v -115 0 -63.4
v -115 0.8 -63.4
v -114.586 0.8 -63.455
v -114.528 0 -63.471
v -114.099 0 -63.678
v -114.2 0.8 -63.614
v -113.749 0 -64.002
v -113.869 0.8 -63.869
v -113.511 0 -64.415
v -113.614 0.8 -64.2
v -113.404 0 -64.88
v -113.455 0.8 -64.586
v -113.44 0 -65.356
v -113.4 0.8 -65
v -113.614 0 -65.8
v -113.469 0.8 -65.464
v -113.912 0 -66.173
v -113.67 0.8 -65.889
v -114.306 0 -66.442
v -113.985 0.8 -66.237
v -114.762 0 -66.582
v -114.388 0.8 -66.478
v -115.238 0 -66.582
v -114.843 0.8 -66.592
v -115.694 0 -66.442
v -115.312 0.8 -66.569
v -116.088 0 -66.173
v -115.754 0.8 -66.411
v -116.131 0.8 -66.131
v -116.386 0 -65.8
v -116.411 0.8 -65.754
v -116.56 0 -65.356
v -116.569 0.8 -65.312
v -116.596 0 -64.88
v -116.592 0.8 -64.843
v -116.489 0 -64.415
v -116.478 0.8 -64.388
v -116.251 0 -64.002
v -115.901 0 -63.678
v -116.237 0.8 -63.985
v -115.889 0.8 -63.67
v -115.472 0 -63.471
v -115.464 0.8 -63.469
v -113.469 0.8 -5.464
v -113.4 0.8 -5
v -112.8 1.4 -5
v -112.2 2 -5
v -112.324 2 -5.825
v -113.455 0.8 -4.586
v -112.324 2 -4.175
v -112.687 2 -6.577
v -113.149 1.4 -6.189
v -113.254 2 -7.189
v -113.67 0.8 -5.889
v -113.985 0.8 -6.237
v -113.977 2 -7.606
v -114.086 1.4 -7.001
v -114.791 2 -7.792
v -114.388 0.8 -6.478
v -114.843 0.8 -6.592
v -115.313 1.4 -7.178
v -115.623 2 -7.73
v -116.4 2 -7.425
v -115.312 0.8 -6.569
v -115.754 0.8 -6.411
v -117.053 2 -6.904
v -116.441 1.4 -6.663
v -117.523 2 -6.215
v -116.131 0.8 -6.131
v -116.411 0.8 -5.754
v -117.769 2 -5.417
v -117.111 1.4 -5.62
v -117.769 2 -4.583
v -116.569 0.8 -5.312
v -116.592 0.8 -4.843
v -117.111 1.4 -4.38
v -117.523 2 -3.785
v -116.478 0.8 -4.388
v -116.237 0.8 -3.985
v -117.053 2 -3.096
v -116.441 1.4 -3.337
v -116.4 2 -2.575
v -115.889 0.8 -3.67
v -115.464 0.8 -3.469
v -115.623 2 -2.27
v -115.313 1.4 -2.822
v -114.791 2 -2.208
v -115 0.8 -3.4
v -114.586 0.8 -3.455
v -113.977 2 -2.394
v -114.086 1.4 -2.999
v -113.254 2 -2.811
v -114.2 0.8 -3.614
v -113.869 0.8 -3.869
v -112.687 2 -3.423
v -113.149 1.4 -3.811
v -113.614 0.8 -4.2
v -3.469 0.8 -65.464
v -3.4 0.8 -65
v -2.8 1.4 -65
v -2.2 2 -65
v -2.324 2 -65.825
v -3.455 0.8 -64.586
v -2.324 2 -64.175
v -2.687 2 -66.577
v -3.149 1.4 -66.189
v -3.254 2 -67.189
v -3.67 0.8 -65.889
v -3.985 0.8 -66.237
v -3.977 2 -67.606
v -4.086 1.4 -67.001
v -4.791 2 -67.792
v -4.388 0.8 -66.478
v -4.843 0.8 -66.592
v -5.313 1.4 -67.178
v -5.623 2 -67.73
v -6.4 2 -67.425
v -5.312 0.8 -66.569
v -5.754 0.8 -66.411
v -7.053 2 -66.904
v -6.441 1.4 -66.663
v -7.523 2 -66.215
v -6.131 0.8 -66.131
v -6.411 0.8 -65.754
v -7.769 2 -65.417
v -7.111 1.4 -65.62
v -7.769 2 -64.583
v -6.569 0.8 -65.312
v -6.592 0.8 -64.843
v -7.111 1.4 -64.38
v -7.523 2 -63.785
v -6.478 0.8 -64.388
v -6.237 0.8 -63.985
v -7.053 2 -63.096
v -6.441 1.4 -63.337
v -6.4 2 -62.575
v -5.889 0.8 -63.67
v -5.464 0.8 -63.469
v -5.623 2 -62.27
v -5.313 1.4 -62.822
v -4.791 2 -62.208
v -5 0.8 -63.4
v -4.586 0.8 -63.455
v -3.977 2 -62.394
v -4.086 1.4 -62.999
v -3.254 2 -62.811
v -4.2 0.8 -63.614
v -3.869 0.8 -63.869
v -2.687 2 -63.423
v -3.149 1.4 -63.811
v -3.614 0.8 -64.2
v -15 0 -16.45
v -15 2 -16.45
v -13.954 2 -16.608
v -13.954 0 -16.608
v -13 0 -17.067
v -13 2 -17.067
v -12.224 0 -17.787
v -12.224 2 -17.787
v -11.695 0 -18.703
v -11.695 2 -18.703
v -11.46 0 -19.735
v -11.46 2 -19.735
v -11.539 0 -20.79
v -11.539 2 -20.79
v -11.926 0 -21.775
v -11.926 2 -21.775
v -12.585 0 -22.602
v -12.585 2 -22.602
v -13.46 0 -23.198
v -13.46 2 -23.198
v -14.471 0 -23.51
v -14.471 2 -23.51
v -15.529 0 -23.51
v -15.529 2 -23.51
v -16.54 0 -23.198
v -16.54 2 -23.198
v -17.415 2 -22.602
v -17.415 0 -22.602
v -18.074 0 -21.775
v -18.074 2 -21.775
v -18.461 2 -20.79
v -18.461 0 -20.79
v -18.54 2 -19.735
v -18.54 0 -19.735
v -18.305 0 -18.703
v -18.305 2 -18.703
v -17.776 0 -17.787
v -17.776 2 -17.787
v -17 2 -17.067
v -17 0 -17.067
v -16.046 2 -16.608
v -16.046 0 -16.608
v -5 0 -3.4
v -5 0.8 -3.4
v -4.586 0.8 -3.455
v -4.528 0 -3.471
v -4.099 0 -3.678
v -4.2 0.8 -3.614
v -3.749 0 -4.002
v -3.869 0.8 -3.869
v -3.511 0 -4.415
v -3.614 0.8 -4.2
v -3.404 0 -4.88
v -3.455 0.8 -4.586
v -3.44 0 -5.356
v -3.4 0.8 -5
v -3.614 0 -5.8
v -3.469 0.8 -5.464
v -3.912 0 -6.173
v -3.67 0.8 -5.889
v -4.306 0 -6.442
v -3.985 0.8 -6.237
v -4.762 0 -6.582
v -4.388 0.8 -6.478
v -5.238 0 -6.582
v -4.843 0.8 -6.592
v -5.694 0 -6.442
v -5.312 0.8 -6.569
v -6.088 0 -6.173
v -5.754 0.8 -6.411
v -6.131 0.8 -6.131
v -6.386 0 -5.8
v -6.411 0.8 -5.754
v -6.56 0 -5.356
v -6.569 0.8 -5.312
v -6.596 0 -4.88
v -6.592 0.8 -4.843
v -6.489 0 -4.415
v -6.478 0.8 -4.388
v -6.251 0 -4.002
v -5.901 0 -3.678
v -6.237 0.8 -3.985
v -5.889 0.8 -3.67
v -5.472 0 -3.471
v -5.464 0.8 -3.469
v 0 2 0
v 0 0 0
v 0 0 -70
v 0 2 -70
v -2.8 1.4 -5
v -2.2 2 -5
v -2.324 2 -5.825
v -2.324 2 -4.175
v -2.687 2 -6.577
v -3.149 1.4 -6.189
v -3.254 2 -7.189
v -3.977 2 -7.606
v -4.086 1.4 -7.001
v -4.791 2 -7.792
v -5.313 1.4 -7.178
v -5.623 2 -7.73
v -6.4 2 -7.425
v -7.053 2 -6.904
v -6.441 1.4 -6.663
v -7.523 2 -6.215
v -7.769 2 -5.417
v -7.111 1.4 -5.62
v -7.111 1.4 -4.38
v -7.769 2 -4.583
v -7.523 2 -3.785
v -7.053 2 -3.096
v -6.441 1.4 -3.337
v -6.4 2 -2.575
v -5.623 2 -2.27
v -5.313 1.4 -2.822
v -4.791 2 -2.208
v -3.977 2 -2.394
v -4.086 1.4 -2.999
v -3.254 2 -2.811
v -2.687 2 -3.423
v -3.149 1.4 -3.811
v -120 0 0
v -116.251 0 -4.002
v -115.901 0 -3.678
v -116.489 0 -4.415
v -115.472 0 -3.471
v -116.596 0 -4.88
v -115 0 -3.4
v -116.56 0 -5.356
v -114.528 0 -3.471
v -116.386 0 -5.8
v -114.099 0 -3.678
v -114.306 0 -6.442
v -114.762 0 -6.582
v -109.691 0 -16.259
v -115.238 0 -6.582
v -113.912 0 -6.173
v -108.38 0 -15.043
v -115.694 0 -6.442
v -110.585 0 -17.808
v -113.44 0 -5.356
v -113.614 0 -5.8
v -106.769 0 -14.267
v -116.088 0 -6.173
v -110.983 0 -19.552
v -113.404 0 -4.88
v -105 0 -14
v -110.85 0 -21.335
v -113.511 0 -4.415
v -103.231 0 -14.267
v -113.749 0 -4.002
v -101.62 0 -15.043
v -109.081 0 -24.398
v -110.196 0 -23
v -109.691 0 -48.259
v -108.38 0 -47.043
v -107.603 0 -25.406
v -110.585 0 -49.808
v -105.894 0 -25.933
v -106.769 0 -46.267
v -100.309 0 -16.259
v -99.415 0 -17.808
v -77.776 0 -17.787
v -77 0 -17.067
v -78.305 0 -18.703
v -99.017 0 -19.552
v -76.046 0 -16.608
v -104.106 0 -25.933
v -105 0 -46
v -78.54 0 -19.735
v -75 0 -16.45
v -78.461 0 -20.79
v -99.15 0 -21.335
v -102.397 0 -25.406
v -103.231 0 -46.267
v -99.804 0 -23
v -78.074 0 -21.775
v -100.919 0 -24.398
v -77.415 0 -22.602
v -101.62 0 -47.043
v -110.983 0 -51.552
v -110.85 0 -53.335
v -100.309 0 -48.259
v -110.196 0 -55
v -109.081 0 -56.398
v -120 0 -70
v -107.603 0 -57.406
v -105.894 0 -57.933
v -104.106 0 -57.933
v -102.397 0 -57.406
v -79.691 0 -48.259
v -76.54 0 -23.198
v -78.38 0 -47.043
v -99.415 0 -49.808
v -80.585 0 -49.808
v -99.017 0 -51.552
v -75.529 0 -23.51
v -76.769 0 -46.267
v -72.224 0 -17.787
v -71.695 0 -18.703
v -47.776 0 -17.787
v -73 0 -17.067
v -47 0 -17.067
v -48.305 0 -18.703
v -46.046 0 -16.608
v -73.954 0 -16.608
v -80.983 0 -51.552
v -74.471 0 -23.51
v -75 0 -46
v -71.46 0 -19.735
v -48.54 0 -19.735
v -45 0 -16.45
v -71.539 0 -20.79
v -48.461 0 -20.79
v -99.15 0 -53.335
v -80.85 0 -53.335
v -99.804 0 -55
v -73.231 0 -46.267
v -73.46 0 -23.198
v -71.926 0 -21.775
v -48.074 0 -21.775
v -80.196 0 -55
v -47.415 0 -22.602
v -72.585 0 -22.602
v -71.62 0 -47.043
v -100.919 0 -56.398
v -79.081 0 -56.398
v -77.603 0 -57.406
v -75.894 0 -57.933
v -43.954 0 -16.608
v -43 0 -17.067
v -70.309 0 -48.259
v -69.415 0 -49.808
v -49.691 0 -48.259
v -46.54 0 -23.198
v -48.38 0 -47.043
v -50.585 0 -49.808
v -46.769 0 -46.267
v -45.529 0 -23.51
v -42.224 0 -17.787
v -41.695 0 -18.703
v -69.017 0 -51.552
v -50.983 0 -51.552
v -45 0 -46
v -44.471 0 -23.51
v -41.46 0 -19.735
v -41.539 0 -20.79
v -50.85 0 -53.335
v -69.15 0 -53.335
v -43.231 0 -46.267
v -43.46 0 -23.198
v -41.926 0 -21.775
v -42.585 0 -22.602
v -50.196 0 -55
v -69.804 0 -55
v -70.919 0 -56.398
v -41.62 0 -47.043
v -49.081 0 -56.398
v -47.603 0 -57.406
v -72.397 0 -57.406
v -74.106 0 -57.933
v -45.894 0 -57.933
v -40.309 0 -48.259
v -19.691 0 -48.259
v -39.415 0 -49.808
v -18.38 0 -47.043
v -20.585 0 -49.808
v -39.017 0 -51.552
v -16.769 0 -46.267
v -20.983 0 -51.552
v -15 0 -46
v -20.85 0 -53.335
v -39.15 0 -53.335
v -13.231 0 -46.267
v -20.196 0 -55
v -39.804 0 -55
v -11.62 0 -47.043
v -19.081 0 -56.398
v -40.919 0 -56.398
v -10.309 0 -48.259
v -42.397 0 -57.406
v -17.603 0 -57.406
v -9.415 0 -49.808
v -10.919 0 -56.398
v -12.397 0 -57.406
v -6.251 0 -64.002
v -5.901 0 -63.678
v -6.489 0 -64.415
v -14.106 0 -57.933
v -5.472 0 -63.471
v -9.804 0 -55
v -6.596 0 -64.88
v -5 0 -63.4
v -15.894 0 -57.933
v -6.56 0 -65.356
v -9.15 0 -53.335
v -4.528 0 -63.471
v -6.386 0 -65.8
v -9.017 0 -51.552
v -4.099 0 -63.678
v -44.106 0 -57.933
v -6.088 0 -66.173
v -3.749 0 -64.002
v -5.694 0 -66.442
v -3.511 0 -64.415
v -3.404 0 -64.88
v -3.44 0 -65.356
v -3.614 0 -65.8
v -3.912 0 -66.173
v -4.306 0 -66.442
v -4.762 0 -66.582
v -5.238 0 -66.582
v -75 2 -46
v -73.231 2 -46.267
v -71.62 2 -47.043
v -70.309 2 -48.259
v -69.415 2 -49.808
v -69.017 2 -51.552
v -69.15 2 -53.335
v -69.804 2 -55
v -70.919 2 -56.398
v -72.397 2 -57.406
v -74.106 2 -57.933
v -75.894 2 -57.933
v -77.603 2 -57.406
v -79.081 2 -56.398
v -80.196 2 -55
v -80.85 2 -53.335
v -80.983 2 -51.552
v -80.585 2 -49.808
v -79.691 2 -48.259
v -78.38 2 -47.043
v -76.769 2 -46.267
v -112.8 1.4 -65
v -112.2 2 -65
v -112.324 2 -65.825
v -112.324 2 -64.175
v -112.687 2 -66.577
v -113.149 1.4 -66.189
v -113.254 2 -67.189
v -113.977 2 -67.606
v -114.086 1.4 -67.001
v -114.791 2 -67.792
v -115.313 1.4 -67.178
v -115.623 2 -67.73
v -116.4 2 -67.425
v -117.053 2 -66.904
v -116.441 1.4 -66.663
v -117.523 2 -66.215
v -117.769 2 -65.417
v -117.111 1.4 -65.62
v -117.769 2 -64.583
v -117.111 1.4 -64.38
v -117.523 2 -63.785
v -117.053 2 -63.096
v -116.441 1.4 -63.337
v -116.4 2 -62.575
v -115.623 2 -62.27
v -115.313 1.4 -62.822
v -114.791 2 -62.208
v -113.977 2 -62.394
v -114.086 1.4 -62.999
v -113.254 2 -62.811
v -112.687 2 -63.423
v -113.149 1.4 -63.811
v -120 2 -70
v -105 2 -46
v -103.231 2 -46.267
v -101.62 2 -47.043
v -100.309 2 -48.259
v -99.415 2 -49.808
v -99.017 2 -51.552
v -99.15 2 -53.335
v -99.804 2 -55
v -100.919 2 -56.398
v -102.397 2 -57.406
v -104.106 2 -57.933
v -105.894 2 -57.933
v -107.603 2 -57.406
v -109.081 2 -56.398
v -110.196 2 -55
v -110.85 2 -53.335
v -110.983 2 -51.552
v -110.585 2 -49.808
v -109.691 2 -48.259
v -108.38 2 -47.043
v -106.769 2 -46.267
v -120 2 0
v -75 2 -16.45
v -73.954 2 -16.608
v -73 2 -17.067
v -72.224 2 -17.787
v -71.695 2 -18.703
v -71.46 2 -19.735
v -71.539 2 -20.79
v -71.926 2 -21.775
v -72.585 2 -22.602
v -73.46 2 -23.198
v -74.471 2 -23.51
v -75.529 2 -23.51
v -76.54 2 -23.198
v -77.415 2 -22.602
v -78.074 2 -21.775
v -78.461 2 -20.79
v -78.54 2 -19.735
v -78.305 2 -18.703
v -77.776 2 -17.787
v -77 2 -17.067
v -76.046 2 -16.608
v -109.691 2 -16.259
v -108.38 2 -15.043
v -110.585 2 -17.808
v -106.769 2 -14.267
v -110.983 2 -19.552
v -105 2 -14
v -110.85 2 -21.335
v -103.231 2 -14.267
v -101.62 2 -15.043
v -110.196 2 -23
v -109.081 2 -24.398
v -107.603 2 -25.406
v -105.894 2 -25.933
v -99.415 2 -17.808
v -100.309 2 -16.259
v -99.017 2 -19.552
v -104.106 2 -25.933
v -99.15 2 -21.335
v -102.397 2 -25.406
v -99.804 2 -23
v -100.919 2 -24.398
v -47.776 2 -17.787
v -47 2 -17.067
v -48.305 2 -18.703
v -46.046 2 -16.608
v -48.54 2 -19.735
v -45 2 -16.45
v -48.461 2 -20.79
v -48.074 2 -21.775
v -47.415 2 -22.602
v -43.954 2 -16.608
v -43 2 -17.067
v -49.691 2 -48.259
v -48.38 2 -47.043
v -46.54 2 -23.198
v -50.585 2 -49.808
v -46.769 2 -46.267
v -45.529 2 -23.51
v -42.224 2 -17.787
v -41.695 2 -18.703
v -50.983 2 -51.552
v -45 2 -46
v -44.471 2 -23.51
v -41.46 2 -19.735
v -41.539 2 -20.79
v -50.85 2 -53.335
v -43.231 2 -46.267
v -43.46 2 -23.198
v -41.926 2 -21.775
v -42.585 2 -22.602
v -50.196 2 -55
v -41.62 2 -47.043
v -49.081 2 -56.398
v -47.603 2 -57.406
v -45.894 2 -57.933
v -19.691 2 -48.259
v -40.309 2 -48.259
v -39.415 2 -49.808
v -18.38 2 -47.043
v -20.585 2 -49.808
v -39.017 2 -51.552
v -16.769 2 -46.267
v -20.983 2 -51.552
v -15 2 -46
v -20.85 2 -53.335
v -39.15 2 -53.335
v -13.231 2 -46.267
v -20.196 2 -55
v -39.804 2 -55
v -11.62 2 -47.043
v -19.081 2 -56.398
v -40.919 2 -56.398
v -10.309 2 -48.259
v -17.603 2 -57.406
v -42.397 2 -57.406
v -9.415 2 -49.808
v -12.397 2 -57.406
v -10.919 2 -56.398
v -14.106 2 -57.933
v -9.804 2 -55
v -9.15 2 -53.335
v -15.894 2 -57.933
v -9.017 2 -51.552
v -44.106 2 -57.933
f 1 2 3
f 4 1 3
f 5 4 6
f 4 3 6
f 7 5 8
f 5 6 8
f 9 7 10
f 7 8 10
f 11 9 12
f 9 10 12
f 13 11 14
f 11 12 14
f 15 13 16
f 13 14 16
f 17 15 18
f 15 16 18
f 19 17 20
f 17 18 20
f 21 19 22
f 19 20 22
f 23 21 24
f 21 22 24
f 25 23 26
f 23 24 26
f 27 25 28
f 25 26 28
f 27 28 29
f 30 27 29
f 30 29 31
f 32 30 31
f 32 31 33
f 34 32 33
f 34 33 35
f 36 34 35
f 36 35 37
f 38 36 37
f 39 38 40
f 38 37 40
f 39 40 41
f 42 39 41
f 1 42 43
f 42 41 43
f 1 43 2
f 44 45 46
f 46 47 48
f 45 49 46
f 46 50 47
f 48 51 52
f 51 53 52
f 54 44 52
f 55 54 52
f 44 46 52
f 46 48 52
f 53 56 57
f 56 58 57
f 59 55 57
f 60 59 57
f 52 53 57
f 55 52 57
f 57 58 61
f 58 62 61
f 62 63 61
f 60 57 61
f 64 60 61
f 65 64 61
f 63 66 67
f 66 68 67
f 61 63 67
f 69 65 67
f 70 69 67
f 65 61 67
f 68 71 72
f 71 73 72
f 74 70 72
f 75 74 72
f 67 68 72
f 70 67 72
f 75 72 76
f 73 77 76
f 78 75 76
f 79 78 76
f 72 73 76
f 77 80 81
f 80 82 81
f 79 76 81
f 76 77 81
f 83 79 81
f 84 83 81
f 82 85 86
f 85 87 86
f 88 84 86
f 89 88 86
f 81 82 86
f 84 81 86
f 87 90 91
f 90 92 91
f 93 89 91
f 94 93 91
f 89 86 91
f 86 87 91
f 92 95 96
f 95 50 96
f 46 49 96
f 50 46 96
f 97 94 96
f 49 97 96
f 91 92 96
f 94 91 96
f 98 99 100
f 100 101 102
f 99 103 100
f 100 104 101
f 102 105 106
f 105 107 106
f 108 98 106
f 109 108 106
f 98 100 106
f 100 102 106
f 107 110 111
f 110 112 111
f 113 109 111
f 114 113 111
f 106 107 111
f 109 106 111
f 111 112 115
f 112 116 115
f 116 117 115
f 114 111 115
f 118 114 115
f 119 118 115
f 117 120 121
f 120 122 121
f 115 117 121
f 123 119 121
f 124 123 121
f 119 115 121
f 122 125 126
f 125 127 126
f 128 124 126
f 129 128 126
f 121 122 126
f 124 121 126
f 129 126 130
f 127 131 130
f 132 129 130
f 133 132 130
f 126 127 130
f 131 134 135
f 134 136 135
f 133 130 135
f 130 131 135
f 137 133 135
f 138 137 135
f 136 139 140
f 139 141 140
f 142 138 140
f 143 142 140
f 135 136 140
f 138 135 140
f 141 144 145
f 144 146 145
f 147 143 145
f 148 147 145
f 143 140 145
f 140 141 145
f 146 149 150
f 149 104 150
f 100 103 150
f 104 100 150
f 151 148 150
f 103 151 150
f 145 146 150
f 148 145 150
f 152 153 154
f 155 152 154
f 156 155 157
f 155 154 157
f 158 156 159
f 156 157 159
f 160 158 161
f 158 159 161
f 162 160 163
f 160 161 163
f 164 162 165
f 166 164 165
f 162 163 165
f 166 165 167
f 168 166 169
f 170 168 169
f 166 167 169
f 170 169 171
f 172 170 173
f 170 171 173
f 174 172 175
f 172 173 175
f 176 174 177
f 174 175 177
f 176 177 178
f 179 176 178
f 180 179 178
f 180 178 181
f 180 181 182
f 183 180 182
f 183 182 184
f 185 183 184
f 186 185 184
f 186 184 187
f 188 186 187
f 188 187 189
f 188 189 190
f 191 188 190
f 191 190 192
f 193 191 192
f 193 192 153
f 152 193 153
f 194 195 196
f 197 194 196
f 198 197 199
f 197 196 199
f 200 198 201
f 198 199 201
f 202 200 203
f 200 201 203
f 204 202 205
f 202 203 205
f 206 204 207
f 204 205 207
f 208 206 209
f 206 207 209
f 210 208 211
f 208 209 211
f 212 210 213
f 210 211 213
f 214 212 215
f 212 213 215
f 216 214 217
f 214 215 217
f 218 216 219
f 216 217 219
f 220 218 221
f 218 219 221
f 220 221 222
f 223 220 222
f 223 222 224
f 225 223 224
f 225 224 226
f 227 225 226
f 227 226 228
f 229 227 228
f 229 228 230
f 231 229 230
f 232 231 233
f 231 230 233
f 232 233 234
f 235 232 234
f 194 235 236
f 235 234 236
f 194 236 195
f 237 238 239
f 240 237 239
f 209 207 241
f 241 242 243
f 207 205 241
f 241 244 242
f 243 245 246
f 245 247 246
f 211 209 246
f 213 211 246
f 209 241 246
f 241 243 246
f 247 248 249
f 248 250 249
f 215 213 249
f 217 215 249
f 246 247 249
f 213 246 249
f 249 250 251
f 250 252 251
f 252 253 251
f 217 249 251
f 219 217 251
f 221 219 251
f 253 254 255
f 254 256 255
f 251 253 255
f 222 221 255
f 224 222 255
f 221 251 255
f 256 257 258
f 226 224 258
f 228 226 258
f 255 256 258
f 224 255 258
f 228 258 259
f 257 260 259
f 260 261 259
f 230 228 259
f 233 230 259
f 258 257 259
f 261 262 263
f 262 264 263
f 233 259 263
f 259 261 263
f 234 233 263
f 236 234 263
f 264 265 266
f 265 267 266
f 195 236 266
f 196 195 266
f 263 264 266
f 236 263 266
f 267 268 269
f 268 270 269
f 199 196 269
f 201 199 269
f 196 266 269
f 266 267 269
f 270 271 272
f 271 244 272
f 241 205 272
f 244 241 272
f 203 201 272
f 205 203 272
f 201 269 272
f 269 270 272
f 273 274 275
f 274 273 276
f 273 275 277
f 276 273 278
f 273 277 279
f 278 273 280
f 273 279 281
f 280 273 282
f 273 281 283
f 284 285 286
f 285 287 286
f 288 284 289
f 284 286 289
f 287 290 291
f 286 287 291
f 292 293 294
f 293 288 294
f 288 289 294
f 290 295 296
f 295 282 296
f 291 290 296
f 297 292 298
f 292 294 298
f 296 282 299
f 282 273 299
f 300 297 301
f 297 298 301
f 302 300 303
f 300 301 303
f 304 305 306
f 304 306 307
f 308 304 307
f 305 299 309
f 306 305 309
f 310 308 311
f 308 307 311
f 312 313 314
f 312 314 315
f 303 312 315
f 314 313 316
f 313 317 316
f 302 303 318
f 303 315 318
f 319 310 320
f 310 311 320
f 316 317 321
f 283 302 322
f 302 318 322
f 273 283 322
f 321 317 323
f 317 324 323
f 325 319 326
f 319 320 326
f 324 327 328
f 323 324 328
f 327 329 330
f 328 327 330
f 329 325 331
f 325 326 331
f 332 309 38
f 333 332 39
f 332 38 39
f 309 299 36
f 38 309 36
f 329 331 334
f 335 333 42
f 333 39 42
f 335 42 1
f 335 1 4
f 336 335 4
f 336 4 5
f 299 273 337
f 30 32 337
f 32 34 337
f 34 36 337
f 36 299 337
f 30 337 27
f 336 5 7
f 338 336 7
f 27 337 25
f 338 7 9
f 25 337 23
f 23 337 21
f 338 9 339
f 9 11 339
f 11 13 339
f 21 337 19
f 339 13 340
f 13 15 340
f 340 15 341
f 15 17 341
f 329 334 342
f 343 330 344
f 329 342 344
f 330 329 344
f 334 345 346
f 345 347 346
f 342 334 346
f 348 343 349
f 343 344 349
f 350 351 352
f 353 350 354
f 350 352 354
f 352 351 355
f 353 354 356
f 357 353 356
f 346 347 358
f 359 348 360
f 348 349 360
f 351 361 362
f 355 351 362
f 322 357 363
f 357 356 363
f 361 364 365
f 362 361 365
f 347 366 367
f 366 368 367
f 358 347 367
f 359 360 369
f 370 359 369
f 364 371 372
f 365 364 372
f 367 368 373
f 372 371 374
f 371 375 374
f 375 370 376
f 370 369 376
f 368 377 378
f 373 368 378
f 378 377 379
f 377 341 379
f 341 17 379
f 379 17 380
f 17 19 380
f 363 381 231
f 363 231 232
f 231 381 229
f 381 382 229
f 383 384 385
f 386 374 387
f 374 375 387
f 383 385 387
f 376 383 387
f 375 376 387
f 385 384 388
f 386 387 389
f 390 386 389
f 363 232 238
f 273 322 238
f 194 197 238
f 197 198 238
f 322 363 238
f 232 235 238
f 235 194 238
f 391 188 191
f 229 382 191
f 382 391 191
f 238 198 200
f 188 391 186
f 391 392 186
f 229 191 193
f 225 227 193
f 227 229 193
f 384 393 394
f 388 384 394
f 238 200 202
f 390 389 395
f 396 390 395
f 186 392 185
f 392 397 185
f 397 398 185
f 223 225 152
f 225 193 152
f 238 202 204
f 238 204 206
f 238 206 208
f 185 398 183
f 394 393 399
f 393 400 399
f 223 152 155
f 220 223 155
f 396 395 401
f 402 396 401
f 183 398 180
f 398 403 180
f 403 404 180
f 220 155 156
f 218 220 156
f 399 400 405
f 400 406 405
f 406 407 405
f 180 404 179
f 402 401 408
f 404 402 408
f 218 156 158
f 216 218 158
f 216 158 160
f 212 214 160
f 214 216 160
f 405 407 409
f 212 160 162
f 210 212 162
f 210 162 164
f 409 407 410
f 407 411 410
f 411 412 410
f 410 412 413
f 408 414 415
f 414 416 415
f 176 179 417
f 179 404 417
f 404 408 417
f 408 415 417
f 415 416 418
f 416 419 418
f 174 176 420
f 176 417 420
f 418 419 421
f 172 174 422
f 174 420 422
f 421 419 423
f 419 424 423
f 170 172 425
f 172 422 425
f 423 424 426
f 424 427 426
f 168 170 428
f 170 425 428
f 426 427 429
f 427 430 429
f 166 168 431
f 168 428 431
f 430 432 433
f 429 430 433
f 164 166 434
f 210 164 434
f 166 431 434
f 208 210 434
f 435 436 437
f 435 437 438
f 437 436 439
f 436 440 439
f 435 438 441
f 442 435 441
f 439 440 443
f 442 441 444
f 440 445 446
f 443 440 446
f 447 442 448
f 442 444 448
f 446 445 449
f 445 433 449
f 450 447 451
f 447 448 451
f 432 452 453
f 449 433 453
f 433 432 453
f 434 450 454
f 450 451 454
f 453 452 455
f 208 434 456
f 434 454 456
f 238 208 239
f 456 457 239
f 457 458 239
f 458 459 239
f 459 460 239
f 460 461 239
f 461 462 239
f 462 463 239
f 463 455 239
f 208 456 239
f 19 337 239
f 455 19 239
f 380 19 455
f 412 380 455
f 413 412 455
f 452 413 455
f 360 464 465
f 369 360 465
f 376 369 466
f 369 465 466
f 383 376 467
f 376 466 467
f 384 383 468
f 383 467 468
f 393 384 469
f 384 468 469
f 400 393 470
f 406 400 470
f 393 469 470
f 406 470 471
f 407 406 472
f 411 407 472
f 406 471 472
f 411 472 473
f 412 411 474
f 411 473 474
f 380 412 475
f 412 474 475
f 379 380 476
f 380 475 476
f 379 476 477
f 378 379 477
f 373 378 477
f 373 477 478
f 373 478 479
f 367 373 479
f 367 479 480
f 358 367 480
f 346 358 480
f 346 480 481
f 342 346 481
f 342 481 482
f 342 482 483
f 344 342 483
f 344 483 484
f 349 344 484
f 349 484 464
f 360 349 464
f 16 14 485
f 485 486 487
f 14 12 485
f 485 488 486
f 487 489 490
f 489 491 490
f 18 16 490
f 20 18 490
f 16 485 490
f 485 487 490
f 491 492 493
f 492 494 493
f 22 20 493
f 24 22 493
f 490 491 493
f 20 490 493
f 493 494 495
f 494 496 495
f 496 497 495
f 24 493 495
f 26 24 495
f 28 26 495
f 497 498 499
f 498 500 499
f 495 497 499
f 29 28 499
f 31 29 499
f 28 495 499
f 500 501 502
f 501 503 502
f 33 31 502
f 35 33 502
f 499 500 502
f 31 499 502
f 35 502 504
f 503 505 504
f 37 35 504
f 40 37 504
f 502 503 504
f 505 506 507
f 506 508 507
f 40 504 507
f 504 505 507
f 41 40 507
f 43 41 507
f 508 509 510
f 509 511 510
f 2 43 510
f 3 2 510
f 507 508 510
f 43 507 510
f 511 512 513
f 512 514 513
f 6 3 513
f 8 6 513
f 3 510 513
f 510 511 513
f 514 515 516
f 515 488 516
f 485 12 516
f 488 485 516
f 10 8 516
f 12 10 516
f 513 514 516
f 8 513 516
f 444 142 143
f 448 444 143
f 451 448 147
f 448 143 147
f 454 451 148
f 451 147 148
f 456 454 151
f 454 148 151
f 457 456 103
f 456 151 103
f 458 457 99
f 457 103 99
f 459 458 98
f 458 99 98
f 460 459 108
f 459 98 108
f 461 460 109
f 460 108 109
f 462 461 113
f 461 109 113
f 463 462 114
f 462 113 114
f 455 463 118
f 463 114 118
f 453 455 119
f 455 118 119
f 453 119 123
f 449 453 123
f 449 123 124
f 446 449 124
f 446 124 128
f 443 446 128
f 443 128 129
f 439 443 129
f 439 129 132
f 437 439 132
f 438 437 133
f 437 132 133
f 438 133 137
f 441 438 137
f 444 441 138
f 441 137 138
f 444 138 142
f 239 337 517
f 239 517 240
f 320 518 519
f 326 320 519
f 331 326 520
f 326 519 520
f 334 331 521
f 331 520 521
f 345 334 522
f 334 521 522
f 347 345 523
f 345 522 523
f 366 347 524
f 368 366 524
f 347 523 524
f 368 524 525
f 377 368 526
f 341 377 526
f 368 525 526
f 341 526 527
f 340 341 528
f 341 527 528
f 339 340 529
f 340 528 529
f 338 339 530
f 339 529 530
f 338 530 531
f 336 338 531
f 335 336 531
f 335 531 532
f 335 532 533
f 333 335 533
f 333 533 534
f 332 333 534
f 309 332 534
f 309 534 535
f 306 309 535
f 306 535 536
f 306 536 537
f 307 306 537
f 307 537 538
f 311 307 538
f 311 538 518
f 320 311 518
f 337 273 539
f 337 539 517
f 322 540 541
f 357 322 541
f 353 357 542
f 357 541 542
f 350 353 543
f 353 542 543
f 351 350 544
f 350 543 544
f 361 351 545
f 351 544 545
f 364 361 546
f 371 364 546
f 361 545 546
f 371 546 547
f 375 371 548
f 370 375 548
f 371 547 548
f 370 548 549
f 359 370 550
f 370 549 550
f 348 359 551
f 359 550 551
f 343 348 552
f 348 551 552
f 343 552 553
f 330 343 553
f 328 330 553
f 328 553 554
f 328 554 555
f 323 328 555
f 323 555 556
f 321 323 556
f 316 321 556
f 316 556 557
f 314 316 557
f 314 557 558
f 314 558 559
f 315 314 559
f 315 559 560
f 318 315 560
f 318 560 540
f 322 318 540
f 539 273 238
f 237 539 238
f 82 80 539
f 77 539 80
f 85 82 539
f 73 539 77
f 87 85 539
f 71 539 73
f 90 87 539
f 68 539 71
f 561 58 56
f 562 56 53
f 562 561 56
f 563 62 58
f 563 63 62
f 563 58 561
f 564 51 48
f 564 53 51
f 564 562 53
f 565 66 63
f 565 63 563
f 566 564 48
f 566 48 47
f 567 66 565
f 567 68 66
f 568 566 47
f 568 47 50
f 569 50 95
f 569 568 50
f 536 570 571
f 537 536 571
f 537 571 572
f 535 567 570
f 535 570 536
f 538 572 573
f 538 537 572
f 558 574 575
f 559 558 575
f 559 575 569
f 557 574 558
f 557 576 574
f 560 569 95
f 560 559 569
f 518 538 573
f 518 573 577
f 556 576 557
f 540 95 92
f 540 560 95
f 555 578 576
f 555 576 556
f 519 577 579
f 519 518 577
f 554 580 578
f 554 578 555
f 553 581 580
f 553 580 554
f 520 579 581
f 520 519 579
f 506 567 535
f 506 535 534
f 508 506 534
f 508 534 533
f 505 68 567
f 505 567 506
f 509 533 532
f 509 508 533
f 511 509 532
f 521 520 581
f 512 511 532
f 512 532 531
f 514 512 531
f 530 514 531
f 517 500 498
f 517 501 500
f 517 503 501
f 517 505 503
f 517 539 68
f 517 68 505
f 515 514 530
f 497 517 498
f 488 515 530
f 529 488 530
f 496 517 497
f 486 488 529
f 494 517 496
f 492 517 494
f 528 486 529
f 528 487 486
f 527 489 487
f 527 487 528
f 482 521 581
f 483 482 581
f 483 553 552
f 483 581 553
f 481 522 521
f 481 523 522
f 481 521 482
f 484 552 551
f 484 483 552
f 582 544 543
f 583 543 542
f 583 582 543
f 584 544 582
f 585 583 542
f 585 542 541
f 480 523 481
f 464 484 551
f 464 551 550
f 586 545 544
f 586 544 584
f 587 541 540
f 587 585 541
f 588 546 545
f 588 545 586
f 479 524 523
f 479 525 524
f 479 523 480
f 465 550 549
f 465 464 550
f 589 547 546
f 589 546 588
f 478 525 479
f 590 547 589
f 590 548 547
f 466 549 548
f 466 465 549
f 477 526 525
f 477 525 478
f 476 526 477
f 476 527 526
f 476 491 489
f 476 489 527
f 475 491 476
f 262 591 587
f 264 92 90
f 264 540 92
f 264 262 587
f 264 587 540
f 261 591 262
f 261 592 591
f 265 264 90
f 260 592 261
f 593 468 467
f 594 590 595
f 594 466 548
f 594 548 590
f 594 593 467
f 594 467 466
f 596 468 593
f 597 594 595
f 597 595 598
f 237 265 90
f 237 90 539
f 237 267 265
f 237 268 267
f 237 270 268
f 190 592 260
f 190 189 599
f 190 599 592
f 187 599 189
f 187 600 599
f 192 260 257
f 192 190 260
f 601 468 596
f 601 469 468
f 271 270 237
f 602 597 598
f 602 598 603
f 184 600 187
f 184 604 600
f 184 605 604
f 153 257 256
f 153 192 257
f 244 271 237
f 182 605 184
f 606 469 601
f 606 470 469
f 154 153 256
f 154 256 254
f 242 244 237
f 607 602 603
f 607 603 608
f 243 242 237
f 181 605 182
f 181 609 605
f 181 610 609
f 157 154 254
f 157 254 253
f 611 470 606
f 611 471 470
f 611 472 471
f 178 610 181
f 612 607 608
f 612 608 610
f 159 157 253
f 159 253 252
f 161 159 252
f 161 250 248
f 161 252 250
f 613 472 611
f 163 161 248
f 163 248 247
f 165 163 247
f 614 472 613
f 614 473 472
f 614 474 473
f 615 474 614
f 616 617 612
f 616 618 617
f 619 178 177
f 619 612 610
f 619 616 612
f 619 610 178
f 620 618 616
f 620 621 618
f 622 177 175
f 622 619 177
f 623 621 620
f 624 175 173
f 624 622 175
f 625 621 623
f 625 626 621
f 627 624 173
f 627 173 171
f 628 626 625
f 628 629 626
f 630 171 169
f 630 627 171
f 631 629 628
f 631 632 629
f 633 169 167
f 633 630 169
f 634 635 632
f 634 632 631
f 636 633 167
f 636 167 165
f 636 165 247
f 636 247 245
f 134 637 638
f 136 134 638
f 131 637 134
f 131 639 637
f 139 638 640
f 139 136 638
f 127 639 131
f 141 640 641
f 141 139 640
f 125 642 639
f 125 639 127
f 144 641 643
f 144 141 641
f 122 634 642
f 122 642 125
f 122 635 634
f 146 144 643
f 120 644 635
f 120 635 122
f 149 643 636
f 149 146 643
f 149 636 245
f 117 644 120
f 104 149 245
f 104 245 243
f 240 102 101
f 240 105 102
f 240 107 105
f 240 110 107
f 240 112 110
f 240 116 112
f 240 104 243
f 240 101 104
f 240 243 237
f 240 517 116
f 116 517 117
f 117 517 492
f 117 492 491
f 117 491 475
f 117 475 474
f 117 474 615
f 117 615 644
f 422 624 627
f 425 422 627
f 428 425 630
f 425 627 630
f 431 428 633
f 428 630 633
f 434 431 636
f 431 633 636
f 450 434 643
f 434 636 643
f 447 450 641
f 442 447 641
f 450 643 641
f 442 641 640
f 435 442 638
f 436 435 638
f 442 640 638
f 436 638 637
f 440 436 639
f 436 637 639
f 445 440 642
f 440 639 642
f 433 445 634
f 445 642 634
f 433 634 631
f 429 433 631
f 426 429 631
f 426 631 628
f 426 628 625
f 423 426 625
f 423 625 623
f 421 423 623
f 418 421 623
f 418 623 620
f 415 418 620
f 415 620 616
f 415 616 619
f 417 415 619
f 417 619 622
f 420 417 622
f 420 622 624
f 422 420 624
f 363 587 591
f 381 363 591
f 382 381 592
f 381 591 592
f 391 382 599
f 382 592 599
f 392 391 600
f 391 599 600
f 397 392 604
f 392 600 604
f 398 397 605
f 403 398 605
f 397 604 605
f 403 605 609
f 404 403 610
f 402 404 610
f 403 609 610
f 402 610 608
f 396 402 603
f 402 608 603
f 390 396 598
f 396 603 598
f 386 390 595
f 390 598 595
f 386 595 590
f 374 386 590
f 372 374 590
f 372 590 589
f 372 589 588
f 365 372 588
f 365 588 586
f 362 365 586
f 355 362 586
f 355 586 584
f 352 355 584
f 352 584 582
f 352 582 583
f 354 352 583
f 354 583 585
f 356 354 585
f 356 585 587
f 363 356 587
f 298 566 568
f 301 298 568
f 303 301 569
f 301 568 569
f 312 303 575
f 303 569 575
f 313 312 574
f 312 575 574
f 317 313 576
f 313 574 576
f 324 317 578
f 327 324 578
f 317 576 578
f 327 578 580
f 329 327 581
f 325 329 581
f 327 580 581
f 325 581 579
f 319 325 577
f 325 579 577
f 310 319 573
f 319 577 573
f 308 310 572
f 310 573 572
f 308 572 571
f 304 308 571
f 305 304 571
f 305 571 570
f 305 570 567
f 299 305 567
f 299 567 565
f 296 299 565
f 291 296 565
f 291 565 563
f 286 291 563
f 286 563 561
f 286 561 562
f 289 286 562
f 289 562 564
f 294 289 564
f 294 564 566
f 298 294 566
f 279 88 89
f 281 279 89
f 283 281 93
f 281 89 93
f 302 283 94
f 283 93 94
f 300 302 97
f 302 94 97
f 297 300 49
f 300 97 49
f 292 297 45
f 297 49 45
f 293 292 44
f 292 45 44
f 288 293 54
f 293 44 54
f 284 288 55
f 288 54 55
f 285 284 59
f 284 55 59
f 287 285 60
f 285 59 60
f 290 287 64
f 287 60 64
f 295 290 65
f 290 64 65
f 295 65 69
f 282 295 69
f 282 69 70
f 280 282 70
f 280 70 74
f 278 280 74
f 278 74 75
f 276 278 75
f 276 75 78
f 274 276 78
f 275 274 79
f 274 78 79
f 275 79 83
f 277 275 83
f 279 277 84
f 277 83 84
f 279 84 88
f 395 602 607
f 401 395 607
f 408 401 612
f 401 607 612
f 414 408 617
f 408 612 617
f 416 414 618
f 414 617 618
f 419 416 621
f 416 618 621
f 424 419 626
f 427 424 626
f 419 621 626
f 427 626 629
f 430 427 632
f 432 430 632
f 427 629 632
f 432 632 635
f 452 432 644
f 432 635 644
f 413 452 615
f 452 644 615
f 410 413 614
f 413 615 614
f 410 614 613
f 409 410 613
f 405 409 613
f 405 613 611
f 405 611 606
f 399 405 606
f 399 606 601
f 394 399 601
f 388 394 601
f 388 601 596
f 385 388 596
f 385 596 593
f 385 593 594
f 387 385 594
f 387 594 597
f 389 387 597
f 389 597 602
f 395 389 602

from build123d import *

# Parameters (mm, degrees)
BOTTOM_PLATE_W                       = 120
BOTTOM_PLATE_H                       = 70
BOTTOM_PLATE_EXT_DEPTH               = 2
TOP_ROW_R                            = 6
TOP_ROW_CUT_DEPTH                    = 139.938835464
BOTTOM_ROW_R                         = 3.55
BOTTOM_ROW_R_2                       = 6
BOTTOM_ROW_CUT_DEPTH                 = 139.938835464
PLATE_SCREWS_R                       = 1.6
PLATE_SCREWS_CUT_DEPTH               = 139.938835464
PLATE_SCREW_HEAD_R                   = 2.8
PLATE_SCREW_HEAD_CUT_DEPTH           = 2
PLATE_SCREW_HEAD_CUT_DRAFT           = -45
PLATE_SCREW_HEAD_CUT_PROFILE_2_DEPTH = 2
PLATE_SCREW_HEAD_CUT_PROFILE_2_DRAFT = -45
PLATE_SCREW_HEAD_CUT_PROFILE_3_DEPTH = 2
PLATE_SCREW_HEAD_CUT_PROFILE_3_DRAFT = -45
PLATE_SCREW_HEAD_CUT_PROFILE_4_DEPTH = 2
PLATE_SCREW_HEAD_CUT_PROFILE_4_DRAFT = -45


with BuildPart() as part:
    # Bottom Plate → Bottom Plate EXT (new body)
    with BuildSketch(Plane(origin=(0, 0, 0), x_dir=(1, 0, 0), z_dir=(0, 1, 0))):
        with Locations((-60, 35)):
            Rectangle(BOTTOM_PLATE_W, BOTTOM_PLATE_H)
    extrude(amount=BOTTOM_PLATE_EXT_DEPTH)

    # Top Row → Top Row Cut (cut, through all)
    with BuildSketch(Plane(origin=(0, 2, 0), x_dir=(1, 0, 0), z_dir=(0, 1, 0))):
        with Locations(Location((-105, 52, 0), (0, 0, 270))):
            Circle(TOP_ROW_R)
        with Locations(Location((-75, 52, 0), (0, 0, 270))):
            Circle(TOP_ROW_R)
        with Locations(Location((-45, 52, 0), (0, 0, 270))):
            Circle(TOP_ROW_R)
        with Locations(Location((-15, 52, 0), (0, 0, 270))):
            Circle(TOP_ROW_R)
    extrude(amount=-TOP_ROW_CUT_DEPTH, mode=Mode.SUBTRACT)

    # Bottom Row → Bottom Row Cut (cut, through all)
    with BuildSketch(Plane(origin=(0, 2, 0), x_dir=(1, 0, 0), z_dir=(0, 1, 0))):
        with Locations(Location((-75, 20, 0), (0, 0, 270))):
            Circle(BOTTOM_ROW_R)
        with Locations(Location((-45, 20, 0), (0, 0, 270))):
            Circle(BOTTOM_ROW_R)
        with Locations(Location((-15, 20, 0), (0, 0, 270))):
            Circle(BOTTOM_ROW_R)
        with Locations(Location((-105, 20, 0), (0, 0, 270))):
            Circle(BOTTOM_ROW_R_2)
    extrude(amount=-BOTTOM_ROW_CUT_DEPTH, mode=Mode.SUBTRACT)

    # Plate Screws → Plate Screws Cut (cut, through all)
    with BuildSketch(Plane(origin=(0, 2, 0), x_dir=(1, 0, 0), z_dir=(0, 1, 0))):
        with Locations(Location((-115, 65, 0), (0, 0, 270))):
            Circle(PLATE_SCREWS_R)
        with Locations(Location((-5, 65, 0), (0, 0, 270))):
            Circle(PLATE_SCREWS_R)
        with Locations(Location((-5, 5, 0), (0, 0, 270))):
            Circle(PLATE_SCREWS_R)
        with Locations(Location((-115, 5, 0), (0, 0, 270))):
            Circle(PLATE_SCREWS_R)
    extrude(amount=-PLATE_SCREWS_CUT_DEPTH, mode=Mode.SUBTRACT)


with BuildPart() as plate_screw_head_cut_tool:
    # Plate Screw Head → Plate Screw Head Cut (with draft: the straight prism first)
    with BuildSketch(Plane(origin=(0, 2, 0), x_dir=(1, 0, 0), z_dir=(0, 1, 0))):
        with Locations((-115, 65)):
            Circle(PLATE_SCREW_HEAD_R)
    extrude(amount=-PLATE_SCREW_HEAD_CUT_DEPTH)
    # Plate Screw Head Cut: the draft: its side faces are tilted about the plane it starts from
    plate_screw_head_cut_sides = [plate_screw_head_cut_tool.faces().sort_by_distance(p)[0] for p in [
        (-117.8, 1, -65),
    ]]
    draft(plate_screw_head_cut_sides, Plane(origin=(0, 2, 0), x_dir=(1, 0, 0), z_dir=(0, 1, 0)), PLATE_SCREW_HEAD_CUT_DRAFT)


with BuildPart() as part_1:
    add(part.part)

    # Plate Screw Head Cut: cut by plate_screw_head_cut_tool
    add(plate_screw_head_cut_tool.part, mode=Mode.SUBTRACT)


with BuildPart() as plate_screw_head_cut_profile_2_tool:
    # Plate Screw Head → Plate Screw Head Cut profile 2 (with draft: the straight prism first)
    with BuildSketch(Plane(origin=(0, 2, 0), x_dir=(1, 0, 0), z_dir=(0, 1, 0))):
        with Locations((-5, 65)):
            Circle(PLATE_SCREW_HEAD_R)
    extrude(amount=-PLATE_SCREW_HEAD_CUT_PROFILE_2_DEPTH)
    # Plate Screw Head Cut profile 2: the draft: its side faces are tilted about the plane it starts from
    plate_screw_head_cut_profile_2_sides = [plate_screw_head_cut_profile_2_tool.faces().sort_by_distance(p)[0] for p in [
        (-7.8, 1, -65),
    ]]
    draft(plate_screw_head_cut_profile_2_sides, Plane(origin=(0, 2, 0), x_dir=(1, 0, 0), z_dir=(0, 1, 0)), PLATE_SCREW_HEAD_CUT_PROFILE_2_DRAFT)


with BuildPart() as part_2:
    add(part_1.part)

    # Plate Screw Head Cut profile 2: cut by plate_screw_head_cut_profile_2_tool
    add(plate_screw_head_cut_profile_2_tool.part, mode=Mode.SUBTRACT)


with BuildPart() as plate_screw_head_cut_profile_3_tool:
    # Plate Screw Head → Plate Screw Head Cut profile 3 (with draft: the straight prism first)
    with BuildSketch(Plane(origin=(0, 2, 0), x_dir=(1, 0, 0), z_dir=(0, 1, 0))):
        with Locations((-5, 5)):
            Circle(PLATE_SCREW_HEAD_R)
    extrude(amount=-PLATE_SCREW_HEAD_CUT_PROFILE_3_DEPTH)
    # Plate Screw Head Cut profile 3: the draft: its side faces are tilted about the plane it starts from
    plate_screw_head_cut_profile_3_sides = [plate_screw_head_cut_profile_3_tool.faces().sort_by_distance(p)[0] for p in [
        (-7.8, 1, -5),
    ]]
    draft(plate_screw_head_cut_profile_3_sides, Plane(origin=(0, 2, 0), x_dir=(1, 0, 0), z_dir=(0, 1, 0)), PLATE_SCREW_HEAD_CUT_PROFILE_3_DRAFT)


with BuildPart() as part_3:
    add(part_2.part)

    # Plate Screw Head Cut profile 3: cut by plate_screw_head_cut_profile_3_tool
    add(plate_screw_head_cut_profile_3_tool.part, mode=Mode.SUBTRACT)


with BuildPart() as plate_screw_head_cut_profile_4_tool:
    # Plate Screw Head → Plate Screw Head Cut profile 4 (with draft: the straight prism first)
    with BuildSketch(Plane(origin=(0, 2, 0), x_dir=(1, 0, 0), z_dir=(0, 1, 0))):
        with Locations((-115, 5)):
            Circle(PLATE_SCREW_HEAD_R)
    extrude(amount=-PLATE_SCREW_HEAD_CUT_PROFILE_4_DEPTH)
    # Plate Screw Head Cut profile 4: the draft: its side faces are tilted about the plane it starts from
    plate_screw_head_cut_profile_4_sides = [plate_screw_head_cut_profile_4_tool.faces().sort_by_distance(p)[0] for p in [
        (-117.8, 1, -5),
    ]]
    draft(plate_screw_head_cut_profile_4_sides, Plane(origin=(0, 2, 0), x_dir=(1, 0, 0), z_dir=(0, 1, 0)), PLATE_SCREW_HEAD_CUT_PROFILE_4_DRAFT)


with BuildPart() as part_4:
    add(part_3.part)

    # Plate Screw Head Cut profile 4: cut by plate_screw_head_cut_profile_4_tool
    add(plate_screw_head_cut_profile_4_tool.part, mode=Mode.SUBTRACT)


solid = part_4.part
